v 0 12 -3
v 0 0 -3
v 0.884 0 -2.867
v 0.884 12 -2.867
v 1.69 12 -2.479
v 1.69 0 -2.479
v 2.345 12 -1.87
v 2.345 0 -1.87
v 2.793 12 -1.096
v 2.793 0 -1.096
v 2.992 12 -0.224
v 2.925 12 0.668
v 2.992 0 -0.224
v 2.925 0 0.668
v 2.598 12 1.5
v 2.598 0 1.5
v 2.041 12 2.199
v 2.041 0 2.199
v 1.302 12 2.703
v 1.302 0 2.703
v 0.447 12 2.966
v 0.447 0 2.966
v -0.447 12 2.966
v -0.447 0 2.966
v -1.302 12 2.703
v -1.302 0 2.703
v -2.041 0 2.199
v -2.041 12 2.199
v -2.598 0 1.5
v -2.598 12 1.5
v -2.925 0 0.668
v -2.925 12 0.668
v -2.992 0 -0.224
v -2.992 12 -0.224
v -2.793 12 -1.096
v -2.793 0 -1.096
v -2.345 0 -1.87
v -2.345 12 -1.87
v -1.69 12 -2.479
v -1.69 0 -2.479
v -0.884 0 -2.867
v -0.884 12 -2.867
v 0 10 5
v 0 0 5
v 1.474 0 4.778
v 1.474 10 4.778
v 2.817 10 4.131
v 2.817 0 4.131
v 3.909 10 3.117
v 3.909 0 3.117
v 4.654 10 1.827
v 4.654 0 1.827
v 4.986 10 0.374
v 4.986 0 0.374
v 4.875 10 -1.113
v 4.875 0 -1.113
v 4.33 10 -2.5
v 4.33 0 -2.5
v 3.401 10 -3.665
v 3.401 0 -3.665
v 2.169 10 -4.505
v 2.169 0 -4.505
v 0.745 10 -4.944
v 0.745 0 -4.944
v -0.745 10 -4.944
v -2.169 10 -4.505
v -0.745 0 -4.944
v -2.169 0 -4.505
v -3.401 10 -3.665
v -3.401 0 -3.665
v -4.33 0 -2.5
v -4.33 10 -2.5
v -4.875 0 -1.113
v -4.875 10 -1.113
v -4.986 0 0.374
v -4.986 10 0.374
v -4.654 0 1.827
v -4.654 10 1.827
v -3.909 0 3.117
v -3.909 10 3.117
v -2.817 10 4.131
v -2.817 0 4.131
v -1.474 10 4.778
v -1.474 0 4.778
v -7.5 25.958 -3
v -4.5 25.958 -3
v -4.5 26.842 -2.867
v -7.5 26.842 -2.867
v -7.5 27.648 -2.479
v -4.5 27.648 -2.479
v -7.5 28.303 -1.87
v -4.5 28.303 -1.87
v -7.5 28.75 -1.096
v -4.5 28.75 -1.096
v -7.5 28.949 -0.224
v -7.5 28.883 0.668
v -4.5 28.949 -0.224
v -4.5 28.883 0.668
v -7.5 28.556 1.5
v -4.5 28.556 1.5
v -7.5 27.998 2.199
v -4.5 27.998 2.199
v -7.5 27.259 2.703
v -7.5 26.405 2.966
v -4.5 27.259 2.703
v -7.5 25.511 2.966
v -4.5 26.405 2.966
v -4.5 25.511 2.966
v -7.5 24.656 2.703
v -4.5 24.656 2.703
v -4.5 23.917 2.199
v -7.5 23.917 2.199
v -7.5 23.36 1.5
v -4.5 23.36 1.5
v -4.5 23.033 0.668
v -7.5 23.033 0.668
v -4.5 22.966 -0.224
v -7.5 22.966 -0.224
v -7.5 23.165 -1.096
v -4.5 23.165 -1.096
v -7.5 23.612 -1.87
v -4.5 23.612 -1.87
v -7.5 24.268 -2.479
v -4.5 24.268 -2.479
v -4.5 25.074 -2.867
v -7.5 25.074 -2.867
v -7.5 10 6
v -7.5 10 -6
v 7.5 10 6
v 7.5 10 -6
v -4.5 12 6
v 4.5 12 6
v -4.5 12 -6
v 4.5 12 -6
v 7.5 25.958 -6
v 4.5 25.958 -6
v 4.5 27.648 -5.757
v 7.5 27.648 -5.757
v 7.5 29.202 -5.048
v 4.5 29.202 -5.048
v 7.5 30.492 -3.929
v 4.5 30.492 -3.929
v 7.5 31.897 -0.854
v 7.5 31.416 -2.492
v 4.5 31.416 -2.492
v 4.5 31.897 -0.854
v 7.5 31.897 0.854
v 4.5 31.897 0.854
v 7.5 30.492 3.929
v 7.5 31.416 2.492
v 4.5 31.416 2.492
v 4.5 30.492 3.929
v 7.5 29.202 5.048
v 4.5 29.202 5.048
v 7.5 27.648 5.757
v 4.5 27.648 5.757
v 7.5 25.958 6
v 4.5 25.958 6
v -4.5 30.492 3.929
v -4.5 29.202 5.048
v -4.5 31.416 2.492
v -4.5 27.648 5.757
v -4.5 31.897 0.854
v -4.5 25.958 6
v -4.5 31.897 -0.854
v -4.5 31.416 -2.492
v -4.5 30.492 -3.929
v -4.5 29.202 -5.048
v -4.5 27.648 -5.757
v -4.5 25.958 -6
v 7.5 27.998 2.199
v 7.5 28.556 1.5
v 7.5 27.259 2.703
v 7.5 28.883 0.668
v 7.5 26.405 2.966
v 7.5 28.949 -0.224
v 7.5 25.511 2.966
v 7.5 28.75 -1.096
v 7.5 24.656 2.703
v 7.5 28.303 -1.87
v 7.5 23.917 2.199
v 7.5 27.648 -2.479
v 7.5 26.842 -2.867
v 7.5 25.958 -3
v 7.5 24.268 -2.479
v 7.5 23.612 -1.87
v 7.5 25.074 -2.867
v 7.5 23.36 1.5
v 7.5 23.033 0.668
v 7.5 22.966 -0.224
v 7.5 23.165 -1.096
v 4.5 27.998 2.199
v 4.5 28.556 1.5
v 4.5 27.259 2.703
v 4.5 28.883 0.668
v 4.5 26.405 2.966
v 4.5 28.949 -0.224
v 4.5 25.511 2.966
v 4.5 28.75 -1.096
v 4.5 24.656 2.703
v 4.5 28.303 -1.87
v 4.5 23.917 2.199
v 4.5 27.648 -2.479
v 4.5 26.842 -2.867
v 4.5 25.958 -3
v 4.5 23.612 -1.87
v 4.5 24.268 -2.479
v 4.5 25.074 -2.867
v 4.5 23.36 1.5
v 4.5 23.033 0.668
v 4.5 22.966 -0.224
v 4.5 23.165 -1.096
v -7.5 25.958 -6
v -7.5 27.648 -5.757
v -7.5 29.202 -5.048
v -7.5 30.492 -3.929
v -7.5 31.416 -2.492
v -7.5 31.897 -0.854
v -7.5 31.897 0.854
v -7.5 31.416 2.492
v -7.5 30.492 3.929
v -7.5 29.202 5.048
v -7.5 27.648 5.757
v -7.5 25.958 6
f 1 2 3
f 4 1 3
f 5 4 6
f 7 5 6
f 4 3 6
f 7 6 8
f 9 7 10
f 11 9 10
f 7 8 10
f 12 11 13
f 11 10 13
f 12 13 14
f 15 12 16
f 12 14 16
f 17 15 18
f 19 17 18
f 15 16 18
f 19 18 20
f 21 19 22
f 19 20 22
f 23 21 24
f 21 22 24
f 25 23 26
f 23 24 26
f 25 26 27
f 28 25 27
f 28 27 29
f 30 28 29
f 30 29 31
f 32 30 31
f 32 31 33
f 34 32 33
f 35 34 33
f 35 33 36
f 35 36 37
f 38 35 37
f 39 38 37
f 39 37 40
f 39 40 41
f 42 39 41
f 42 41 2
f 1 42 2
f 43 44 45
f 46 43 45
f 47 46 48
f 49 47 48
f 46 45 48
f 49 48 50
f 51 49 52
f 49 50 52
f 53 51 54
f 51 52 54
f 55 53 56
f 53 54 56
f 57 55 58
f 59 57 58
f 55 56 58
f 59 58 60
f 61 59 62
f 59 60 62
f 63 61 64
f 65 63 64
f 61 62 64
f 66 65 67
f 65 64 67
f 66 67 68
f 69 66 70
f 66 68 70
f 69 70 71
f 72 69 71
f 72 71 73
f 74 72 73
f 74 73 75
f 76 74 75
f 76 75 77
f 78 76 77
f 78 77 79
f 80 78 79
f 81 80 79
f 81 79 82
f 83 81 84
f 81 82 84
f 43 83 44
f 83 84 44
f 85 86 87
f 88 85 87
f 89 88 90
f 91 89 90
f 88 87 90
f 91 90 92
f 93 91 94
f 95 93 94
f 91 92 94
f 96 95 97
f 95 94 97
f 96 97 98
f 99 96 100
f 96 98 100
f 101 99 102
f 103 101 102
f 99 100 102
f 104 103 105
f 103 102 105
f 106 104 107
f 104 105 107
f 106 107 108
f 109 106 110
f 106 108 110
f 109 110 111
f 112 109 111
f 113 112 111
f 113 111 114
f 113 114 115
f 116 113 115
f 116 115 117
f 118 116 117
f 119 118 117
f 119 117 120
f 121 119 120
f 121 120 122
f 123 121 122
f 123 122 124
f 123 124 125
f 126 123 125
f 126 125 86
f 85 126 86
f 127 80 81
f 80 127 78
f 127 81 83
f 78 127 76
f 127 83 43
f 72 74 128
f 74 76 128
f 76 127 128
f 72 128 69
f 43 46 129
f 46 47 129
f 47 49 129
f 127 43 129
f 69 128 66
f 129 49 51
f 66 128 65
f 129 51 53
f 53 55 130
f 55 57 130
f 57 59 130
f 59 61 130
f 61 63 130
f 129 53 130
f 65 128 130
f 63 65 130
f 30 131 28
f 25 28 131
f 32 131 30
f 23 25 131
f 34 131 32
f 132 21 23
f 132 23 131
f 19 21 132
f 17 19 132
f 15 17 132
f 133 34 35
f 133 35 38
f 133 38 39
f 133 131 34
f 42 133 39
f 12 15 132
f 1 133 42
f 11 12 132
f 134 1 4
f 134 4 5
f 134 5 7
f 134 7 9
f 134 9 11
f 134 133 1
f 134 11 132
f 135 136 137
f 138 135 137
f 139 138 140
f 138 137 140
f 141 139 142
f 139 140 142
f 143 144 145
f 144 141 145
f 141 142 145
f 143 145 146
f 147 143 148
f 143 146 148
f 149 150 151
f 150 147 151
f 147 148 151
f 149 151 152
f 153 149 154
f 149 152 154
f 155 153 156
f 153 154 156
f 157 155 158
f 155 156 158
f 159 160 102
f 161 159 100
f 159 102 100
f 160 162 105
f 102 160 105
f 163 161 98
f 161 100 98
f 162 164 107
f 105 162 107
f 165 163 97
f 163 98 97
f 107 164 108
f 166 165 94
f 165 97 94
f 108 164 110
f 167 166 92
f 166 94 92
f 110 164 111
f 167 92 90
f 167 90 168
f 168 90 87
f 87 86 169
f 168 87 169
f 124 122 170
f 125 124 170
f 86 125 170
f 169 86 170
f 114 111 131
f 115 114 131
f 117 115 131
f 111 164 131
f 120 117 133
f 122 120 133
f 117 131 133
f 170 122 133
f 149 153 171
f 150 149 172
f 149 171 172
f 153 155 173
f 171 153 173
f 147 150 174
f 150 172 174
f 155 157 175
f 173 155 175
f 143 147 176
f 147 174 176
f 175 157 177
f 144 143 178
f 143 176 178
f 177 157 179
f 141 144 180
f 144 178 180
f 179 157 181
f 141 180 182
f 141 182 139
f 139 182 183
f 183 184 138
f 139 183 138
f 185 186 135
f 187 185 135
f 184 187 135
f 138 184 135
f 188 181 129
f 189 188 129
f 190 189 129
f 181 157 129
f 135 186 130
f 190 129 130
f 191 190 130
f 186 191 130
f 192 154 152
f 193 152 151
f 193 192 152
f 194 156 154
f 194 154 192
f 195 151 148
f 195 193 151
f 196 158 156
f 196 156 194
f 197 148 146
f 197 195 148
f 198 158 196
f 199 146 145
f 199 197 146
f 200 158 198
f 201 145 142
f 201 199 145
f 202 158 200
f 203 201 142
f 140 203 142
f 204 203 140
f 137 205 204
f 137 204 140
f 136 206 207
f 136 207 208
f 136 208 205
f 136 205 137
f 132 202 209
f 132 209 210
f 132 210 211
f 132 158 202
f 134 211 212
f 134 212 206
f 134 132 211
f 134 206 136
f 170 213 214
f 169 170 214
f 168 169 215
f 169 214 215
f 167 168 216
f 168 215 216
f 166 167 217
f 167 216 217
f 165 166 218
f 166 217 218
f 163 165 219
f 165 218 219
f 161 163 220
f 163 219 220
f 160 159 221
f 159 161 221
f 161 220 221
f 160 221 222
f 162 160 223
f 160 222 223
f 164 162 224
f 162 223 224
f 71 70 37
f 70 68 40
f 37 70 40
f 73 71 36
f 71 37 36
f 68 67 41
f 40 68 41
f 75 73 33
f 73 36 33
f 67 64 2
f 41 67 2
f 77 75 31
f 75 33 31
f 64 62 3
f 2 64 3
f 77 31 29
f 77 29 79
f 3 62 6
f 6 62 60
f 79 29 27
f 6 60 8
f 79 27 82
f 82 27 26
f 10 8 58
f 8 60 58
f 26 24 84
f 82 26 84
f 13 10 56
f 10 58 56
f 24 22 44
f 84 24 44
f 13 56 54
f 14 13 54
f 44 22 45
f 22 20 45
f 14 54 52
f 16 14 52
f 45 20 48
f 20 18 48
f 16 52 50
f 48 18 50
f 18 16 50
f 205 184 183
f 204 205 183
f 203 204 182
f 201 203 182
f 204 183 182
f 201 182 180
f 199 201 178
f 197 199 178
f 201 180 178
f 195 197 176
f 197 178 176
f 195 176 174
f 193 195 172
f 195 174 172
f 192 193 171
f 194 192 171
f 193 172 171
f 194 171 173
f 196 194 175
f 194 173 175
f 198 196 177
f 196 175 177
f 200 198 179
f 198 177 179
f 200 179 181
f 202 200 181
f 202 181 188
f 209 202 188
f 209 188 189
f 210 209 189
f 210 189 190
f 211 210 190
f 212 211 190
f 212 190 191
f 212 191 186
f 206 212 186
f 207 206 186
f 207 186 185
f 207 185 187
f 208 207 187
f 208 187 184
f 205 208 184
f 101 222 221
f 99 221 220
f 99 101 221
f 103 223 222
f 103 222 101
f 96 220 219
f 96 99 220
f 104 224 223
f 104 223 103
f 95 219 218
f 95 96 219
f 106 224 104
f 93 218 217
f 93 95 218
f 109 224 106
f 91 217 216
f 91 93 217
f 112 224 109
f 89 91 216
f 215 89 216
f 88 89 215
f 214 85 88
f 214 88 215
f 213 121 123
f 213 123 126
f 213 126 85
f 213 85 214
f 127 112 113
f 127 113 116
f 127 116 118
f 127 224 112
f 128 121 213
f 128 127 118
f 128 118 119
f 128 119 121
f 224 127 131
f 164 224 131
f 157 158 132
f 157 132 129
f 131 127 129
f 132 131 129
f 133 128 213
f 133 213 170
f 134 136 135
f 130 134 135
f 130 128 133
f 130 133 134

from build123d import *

# Parameters (mm, degrees)
SKETCH_1_R          = 5
EXTRUDE_1_DEPTH     = 10
SKETCH_2_W          = 15
SKETCH_2_H          = 12
EXTRUDE_2_DEPTH     = 2
SKETCH_4_R          = 3
CUT_EXTRUDE_1_DEPTH = 16.370426149
SKETCH_5_W          = 3
SKETCH_5_H          = 12
EXTRUDE_3_DEPTH     = 20
SKETCH_6_OUTSIDE_W  = 21.464
SKETCH_6_OUTSIDE_H  = 41.464
CUT_EXTRUDE_2_DEPTH = 36.846896658
SKETCH_7_R          = 3
CUT_EXTRUDE_3_DEPTH = 36.809255992


with BuildPart() as part:
    # 草图1 → 凸台-拉伸1 (new body)
    with BuildSketch(Plane(origin=(0, 0, 0), x_dir=(1, 0, 0), z_dir=(0, 1, 0))):
        with Locations(Location((0, 0, 0), (0, 0, 270))):
            Circle(SKETCH_1_R)
    extrude(amount=EXTRUDE_1_DEPTH)

    # 草图2 → 凸台-拉伸2 (add)
    with BuildSketch(Plane(origin=(0, 10, 0), x_dir=(1, 0, 0), z_dir=(0, 1, 0))):
        Rectangle(SKETCH_2_W, SKETCH_2_H)
    extrude(amount=EXTRUDE_2_DEPTH)

    # 草图4 → 切除-拉伸1 (cut, through all)
    with BuildSketch(Plane(origin=(0, 0, 0), x_dir=(-1, 0, 0), z_dir=(0, -1, 0))):
        with Locations(Location((0, 0, 0), (0, 0, 90))):
            Circle(SKETCH_4_R)
    extrude(amount=-CUT_EXTRUDE_1_DEPTH, mode=Mode.SUBTRACT)

    # 草图5 → 凸台-拉伸3 (add)
    with BuildSketch(Plane(origin=(0, 12, 0), x_dir=(1, 0, 0), z_dir=(0, 1, 0))):
        with Locations((-6, 0)):
            Rectangle(SKETCH_5_W, SKETCH_5_H)
        with Locations((6, 0)):
            Rectangle(SKETCH_5_W, SKETCH_5_H)
    extrude(amount=EXTRUDE_3_DEPTH)

    # 草图6 outside → 切除-拉伸2 (cut, through all)
    with BuildSketch(Plane.ZY.offset(7.5)):
        with Locations((0, 16)):
            Rectangle(SKETCH_6_OUTSIDE_W, SKETCH_6_OUTSIDE_H)
        with BuildLine():
            Line((-6, -1.626301301), (-6, 25.957828691))
            ThreePointArc((-6, 25.957828691), (0, 31.957828691), (6, 25.957828691))
            Line((6, 25.957828691), (6, -1.626301301))
            ThreePointArc((6, -1.626301301), (0, -7.626301301), (-6, -1.626301301))
        make_face(mode=Mode.SUBTRACT)
    extrude(amount=-CUT_EXTRUDE_2_DEPTH, mode=Mode.SUBTRACT)

    # 草图7 → 切除-拉伸3 (cut, through all)
    with BuildSketch(Plane(origin=(7.5, 0, 0), x_dir=(0, 0, -1), z_dir=(1, 0, 0))):
        with Locations((0, 25.957828691)):
            Circle(SKETCH_7_R)
    extrude(amount=-CUT_EXTRUDE_3_DEPTH, mode=Mode.SUBTRACT)


solid = part.part
